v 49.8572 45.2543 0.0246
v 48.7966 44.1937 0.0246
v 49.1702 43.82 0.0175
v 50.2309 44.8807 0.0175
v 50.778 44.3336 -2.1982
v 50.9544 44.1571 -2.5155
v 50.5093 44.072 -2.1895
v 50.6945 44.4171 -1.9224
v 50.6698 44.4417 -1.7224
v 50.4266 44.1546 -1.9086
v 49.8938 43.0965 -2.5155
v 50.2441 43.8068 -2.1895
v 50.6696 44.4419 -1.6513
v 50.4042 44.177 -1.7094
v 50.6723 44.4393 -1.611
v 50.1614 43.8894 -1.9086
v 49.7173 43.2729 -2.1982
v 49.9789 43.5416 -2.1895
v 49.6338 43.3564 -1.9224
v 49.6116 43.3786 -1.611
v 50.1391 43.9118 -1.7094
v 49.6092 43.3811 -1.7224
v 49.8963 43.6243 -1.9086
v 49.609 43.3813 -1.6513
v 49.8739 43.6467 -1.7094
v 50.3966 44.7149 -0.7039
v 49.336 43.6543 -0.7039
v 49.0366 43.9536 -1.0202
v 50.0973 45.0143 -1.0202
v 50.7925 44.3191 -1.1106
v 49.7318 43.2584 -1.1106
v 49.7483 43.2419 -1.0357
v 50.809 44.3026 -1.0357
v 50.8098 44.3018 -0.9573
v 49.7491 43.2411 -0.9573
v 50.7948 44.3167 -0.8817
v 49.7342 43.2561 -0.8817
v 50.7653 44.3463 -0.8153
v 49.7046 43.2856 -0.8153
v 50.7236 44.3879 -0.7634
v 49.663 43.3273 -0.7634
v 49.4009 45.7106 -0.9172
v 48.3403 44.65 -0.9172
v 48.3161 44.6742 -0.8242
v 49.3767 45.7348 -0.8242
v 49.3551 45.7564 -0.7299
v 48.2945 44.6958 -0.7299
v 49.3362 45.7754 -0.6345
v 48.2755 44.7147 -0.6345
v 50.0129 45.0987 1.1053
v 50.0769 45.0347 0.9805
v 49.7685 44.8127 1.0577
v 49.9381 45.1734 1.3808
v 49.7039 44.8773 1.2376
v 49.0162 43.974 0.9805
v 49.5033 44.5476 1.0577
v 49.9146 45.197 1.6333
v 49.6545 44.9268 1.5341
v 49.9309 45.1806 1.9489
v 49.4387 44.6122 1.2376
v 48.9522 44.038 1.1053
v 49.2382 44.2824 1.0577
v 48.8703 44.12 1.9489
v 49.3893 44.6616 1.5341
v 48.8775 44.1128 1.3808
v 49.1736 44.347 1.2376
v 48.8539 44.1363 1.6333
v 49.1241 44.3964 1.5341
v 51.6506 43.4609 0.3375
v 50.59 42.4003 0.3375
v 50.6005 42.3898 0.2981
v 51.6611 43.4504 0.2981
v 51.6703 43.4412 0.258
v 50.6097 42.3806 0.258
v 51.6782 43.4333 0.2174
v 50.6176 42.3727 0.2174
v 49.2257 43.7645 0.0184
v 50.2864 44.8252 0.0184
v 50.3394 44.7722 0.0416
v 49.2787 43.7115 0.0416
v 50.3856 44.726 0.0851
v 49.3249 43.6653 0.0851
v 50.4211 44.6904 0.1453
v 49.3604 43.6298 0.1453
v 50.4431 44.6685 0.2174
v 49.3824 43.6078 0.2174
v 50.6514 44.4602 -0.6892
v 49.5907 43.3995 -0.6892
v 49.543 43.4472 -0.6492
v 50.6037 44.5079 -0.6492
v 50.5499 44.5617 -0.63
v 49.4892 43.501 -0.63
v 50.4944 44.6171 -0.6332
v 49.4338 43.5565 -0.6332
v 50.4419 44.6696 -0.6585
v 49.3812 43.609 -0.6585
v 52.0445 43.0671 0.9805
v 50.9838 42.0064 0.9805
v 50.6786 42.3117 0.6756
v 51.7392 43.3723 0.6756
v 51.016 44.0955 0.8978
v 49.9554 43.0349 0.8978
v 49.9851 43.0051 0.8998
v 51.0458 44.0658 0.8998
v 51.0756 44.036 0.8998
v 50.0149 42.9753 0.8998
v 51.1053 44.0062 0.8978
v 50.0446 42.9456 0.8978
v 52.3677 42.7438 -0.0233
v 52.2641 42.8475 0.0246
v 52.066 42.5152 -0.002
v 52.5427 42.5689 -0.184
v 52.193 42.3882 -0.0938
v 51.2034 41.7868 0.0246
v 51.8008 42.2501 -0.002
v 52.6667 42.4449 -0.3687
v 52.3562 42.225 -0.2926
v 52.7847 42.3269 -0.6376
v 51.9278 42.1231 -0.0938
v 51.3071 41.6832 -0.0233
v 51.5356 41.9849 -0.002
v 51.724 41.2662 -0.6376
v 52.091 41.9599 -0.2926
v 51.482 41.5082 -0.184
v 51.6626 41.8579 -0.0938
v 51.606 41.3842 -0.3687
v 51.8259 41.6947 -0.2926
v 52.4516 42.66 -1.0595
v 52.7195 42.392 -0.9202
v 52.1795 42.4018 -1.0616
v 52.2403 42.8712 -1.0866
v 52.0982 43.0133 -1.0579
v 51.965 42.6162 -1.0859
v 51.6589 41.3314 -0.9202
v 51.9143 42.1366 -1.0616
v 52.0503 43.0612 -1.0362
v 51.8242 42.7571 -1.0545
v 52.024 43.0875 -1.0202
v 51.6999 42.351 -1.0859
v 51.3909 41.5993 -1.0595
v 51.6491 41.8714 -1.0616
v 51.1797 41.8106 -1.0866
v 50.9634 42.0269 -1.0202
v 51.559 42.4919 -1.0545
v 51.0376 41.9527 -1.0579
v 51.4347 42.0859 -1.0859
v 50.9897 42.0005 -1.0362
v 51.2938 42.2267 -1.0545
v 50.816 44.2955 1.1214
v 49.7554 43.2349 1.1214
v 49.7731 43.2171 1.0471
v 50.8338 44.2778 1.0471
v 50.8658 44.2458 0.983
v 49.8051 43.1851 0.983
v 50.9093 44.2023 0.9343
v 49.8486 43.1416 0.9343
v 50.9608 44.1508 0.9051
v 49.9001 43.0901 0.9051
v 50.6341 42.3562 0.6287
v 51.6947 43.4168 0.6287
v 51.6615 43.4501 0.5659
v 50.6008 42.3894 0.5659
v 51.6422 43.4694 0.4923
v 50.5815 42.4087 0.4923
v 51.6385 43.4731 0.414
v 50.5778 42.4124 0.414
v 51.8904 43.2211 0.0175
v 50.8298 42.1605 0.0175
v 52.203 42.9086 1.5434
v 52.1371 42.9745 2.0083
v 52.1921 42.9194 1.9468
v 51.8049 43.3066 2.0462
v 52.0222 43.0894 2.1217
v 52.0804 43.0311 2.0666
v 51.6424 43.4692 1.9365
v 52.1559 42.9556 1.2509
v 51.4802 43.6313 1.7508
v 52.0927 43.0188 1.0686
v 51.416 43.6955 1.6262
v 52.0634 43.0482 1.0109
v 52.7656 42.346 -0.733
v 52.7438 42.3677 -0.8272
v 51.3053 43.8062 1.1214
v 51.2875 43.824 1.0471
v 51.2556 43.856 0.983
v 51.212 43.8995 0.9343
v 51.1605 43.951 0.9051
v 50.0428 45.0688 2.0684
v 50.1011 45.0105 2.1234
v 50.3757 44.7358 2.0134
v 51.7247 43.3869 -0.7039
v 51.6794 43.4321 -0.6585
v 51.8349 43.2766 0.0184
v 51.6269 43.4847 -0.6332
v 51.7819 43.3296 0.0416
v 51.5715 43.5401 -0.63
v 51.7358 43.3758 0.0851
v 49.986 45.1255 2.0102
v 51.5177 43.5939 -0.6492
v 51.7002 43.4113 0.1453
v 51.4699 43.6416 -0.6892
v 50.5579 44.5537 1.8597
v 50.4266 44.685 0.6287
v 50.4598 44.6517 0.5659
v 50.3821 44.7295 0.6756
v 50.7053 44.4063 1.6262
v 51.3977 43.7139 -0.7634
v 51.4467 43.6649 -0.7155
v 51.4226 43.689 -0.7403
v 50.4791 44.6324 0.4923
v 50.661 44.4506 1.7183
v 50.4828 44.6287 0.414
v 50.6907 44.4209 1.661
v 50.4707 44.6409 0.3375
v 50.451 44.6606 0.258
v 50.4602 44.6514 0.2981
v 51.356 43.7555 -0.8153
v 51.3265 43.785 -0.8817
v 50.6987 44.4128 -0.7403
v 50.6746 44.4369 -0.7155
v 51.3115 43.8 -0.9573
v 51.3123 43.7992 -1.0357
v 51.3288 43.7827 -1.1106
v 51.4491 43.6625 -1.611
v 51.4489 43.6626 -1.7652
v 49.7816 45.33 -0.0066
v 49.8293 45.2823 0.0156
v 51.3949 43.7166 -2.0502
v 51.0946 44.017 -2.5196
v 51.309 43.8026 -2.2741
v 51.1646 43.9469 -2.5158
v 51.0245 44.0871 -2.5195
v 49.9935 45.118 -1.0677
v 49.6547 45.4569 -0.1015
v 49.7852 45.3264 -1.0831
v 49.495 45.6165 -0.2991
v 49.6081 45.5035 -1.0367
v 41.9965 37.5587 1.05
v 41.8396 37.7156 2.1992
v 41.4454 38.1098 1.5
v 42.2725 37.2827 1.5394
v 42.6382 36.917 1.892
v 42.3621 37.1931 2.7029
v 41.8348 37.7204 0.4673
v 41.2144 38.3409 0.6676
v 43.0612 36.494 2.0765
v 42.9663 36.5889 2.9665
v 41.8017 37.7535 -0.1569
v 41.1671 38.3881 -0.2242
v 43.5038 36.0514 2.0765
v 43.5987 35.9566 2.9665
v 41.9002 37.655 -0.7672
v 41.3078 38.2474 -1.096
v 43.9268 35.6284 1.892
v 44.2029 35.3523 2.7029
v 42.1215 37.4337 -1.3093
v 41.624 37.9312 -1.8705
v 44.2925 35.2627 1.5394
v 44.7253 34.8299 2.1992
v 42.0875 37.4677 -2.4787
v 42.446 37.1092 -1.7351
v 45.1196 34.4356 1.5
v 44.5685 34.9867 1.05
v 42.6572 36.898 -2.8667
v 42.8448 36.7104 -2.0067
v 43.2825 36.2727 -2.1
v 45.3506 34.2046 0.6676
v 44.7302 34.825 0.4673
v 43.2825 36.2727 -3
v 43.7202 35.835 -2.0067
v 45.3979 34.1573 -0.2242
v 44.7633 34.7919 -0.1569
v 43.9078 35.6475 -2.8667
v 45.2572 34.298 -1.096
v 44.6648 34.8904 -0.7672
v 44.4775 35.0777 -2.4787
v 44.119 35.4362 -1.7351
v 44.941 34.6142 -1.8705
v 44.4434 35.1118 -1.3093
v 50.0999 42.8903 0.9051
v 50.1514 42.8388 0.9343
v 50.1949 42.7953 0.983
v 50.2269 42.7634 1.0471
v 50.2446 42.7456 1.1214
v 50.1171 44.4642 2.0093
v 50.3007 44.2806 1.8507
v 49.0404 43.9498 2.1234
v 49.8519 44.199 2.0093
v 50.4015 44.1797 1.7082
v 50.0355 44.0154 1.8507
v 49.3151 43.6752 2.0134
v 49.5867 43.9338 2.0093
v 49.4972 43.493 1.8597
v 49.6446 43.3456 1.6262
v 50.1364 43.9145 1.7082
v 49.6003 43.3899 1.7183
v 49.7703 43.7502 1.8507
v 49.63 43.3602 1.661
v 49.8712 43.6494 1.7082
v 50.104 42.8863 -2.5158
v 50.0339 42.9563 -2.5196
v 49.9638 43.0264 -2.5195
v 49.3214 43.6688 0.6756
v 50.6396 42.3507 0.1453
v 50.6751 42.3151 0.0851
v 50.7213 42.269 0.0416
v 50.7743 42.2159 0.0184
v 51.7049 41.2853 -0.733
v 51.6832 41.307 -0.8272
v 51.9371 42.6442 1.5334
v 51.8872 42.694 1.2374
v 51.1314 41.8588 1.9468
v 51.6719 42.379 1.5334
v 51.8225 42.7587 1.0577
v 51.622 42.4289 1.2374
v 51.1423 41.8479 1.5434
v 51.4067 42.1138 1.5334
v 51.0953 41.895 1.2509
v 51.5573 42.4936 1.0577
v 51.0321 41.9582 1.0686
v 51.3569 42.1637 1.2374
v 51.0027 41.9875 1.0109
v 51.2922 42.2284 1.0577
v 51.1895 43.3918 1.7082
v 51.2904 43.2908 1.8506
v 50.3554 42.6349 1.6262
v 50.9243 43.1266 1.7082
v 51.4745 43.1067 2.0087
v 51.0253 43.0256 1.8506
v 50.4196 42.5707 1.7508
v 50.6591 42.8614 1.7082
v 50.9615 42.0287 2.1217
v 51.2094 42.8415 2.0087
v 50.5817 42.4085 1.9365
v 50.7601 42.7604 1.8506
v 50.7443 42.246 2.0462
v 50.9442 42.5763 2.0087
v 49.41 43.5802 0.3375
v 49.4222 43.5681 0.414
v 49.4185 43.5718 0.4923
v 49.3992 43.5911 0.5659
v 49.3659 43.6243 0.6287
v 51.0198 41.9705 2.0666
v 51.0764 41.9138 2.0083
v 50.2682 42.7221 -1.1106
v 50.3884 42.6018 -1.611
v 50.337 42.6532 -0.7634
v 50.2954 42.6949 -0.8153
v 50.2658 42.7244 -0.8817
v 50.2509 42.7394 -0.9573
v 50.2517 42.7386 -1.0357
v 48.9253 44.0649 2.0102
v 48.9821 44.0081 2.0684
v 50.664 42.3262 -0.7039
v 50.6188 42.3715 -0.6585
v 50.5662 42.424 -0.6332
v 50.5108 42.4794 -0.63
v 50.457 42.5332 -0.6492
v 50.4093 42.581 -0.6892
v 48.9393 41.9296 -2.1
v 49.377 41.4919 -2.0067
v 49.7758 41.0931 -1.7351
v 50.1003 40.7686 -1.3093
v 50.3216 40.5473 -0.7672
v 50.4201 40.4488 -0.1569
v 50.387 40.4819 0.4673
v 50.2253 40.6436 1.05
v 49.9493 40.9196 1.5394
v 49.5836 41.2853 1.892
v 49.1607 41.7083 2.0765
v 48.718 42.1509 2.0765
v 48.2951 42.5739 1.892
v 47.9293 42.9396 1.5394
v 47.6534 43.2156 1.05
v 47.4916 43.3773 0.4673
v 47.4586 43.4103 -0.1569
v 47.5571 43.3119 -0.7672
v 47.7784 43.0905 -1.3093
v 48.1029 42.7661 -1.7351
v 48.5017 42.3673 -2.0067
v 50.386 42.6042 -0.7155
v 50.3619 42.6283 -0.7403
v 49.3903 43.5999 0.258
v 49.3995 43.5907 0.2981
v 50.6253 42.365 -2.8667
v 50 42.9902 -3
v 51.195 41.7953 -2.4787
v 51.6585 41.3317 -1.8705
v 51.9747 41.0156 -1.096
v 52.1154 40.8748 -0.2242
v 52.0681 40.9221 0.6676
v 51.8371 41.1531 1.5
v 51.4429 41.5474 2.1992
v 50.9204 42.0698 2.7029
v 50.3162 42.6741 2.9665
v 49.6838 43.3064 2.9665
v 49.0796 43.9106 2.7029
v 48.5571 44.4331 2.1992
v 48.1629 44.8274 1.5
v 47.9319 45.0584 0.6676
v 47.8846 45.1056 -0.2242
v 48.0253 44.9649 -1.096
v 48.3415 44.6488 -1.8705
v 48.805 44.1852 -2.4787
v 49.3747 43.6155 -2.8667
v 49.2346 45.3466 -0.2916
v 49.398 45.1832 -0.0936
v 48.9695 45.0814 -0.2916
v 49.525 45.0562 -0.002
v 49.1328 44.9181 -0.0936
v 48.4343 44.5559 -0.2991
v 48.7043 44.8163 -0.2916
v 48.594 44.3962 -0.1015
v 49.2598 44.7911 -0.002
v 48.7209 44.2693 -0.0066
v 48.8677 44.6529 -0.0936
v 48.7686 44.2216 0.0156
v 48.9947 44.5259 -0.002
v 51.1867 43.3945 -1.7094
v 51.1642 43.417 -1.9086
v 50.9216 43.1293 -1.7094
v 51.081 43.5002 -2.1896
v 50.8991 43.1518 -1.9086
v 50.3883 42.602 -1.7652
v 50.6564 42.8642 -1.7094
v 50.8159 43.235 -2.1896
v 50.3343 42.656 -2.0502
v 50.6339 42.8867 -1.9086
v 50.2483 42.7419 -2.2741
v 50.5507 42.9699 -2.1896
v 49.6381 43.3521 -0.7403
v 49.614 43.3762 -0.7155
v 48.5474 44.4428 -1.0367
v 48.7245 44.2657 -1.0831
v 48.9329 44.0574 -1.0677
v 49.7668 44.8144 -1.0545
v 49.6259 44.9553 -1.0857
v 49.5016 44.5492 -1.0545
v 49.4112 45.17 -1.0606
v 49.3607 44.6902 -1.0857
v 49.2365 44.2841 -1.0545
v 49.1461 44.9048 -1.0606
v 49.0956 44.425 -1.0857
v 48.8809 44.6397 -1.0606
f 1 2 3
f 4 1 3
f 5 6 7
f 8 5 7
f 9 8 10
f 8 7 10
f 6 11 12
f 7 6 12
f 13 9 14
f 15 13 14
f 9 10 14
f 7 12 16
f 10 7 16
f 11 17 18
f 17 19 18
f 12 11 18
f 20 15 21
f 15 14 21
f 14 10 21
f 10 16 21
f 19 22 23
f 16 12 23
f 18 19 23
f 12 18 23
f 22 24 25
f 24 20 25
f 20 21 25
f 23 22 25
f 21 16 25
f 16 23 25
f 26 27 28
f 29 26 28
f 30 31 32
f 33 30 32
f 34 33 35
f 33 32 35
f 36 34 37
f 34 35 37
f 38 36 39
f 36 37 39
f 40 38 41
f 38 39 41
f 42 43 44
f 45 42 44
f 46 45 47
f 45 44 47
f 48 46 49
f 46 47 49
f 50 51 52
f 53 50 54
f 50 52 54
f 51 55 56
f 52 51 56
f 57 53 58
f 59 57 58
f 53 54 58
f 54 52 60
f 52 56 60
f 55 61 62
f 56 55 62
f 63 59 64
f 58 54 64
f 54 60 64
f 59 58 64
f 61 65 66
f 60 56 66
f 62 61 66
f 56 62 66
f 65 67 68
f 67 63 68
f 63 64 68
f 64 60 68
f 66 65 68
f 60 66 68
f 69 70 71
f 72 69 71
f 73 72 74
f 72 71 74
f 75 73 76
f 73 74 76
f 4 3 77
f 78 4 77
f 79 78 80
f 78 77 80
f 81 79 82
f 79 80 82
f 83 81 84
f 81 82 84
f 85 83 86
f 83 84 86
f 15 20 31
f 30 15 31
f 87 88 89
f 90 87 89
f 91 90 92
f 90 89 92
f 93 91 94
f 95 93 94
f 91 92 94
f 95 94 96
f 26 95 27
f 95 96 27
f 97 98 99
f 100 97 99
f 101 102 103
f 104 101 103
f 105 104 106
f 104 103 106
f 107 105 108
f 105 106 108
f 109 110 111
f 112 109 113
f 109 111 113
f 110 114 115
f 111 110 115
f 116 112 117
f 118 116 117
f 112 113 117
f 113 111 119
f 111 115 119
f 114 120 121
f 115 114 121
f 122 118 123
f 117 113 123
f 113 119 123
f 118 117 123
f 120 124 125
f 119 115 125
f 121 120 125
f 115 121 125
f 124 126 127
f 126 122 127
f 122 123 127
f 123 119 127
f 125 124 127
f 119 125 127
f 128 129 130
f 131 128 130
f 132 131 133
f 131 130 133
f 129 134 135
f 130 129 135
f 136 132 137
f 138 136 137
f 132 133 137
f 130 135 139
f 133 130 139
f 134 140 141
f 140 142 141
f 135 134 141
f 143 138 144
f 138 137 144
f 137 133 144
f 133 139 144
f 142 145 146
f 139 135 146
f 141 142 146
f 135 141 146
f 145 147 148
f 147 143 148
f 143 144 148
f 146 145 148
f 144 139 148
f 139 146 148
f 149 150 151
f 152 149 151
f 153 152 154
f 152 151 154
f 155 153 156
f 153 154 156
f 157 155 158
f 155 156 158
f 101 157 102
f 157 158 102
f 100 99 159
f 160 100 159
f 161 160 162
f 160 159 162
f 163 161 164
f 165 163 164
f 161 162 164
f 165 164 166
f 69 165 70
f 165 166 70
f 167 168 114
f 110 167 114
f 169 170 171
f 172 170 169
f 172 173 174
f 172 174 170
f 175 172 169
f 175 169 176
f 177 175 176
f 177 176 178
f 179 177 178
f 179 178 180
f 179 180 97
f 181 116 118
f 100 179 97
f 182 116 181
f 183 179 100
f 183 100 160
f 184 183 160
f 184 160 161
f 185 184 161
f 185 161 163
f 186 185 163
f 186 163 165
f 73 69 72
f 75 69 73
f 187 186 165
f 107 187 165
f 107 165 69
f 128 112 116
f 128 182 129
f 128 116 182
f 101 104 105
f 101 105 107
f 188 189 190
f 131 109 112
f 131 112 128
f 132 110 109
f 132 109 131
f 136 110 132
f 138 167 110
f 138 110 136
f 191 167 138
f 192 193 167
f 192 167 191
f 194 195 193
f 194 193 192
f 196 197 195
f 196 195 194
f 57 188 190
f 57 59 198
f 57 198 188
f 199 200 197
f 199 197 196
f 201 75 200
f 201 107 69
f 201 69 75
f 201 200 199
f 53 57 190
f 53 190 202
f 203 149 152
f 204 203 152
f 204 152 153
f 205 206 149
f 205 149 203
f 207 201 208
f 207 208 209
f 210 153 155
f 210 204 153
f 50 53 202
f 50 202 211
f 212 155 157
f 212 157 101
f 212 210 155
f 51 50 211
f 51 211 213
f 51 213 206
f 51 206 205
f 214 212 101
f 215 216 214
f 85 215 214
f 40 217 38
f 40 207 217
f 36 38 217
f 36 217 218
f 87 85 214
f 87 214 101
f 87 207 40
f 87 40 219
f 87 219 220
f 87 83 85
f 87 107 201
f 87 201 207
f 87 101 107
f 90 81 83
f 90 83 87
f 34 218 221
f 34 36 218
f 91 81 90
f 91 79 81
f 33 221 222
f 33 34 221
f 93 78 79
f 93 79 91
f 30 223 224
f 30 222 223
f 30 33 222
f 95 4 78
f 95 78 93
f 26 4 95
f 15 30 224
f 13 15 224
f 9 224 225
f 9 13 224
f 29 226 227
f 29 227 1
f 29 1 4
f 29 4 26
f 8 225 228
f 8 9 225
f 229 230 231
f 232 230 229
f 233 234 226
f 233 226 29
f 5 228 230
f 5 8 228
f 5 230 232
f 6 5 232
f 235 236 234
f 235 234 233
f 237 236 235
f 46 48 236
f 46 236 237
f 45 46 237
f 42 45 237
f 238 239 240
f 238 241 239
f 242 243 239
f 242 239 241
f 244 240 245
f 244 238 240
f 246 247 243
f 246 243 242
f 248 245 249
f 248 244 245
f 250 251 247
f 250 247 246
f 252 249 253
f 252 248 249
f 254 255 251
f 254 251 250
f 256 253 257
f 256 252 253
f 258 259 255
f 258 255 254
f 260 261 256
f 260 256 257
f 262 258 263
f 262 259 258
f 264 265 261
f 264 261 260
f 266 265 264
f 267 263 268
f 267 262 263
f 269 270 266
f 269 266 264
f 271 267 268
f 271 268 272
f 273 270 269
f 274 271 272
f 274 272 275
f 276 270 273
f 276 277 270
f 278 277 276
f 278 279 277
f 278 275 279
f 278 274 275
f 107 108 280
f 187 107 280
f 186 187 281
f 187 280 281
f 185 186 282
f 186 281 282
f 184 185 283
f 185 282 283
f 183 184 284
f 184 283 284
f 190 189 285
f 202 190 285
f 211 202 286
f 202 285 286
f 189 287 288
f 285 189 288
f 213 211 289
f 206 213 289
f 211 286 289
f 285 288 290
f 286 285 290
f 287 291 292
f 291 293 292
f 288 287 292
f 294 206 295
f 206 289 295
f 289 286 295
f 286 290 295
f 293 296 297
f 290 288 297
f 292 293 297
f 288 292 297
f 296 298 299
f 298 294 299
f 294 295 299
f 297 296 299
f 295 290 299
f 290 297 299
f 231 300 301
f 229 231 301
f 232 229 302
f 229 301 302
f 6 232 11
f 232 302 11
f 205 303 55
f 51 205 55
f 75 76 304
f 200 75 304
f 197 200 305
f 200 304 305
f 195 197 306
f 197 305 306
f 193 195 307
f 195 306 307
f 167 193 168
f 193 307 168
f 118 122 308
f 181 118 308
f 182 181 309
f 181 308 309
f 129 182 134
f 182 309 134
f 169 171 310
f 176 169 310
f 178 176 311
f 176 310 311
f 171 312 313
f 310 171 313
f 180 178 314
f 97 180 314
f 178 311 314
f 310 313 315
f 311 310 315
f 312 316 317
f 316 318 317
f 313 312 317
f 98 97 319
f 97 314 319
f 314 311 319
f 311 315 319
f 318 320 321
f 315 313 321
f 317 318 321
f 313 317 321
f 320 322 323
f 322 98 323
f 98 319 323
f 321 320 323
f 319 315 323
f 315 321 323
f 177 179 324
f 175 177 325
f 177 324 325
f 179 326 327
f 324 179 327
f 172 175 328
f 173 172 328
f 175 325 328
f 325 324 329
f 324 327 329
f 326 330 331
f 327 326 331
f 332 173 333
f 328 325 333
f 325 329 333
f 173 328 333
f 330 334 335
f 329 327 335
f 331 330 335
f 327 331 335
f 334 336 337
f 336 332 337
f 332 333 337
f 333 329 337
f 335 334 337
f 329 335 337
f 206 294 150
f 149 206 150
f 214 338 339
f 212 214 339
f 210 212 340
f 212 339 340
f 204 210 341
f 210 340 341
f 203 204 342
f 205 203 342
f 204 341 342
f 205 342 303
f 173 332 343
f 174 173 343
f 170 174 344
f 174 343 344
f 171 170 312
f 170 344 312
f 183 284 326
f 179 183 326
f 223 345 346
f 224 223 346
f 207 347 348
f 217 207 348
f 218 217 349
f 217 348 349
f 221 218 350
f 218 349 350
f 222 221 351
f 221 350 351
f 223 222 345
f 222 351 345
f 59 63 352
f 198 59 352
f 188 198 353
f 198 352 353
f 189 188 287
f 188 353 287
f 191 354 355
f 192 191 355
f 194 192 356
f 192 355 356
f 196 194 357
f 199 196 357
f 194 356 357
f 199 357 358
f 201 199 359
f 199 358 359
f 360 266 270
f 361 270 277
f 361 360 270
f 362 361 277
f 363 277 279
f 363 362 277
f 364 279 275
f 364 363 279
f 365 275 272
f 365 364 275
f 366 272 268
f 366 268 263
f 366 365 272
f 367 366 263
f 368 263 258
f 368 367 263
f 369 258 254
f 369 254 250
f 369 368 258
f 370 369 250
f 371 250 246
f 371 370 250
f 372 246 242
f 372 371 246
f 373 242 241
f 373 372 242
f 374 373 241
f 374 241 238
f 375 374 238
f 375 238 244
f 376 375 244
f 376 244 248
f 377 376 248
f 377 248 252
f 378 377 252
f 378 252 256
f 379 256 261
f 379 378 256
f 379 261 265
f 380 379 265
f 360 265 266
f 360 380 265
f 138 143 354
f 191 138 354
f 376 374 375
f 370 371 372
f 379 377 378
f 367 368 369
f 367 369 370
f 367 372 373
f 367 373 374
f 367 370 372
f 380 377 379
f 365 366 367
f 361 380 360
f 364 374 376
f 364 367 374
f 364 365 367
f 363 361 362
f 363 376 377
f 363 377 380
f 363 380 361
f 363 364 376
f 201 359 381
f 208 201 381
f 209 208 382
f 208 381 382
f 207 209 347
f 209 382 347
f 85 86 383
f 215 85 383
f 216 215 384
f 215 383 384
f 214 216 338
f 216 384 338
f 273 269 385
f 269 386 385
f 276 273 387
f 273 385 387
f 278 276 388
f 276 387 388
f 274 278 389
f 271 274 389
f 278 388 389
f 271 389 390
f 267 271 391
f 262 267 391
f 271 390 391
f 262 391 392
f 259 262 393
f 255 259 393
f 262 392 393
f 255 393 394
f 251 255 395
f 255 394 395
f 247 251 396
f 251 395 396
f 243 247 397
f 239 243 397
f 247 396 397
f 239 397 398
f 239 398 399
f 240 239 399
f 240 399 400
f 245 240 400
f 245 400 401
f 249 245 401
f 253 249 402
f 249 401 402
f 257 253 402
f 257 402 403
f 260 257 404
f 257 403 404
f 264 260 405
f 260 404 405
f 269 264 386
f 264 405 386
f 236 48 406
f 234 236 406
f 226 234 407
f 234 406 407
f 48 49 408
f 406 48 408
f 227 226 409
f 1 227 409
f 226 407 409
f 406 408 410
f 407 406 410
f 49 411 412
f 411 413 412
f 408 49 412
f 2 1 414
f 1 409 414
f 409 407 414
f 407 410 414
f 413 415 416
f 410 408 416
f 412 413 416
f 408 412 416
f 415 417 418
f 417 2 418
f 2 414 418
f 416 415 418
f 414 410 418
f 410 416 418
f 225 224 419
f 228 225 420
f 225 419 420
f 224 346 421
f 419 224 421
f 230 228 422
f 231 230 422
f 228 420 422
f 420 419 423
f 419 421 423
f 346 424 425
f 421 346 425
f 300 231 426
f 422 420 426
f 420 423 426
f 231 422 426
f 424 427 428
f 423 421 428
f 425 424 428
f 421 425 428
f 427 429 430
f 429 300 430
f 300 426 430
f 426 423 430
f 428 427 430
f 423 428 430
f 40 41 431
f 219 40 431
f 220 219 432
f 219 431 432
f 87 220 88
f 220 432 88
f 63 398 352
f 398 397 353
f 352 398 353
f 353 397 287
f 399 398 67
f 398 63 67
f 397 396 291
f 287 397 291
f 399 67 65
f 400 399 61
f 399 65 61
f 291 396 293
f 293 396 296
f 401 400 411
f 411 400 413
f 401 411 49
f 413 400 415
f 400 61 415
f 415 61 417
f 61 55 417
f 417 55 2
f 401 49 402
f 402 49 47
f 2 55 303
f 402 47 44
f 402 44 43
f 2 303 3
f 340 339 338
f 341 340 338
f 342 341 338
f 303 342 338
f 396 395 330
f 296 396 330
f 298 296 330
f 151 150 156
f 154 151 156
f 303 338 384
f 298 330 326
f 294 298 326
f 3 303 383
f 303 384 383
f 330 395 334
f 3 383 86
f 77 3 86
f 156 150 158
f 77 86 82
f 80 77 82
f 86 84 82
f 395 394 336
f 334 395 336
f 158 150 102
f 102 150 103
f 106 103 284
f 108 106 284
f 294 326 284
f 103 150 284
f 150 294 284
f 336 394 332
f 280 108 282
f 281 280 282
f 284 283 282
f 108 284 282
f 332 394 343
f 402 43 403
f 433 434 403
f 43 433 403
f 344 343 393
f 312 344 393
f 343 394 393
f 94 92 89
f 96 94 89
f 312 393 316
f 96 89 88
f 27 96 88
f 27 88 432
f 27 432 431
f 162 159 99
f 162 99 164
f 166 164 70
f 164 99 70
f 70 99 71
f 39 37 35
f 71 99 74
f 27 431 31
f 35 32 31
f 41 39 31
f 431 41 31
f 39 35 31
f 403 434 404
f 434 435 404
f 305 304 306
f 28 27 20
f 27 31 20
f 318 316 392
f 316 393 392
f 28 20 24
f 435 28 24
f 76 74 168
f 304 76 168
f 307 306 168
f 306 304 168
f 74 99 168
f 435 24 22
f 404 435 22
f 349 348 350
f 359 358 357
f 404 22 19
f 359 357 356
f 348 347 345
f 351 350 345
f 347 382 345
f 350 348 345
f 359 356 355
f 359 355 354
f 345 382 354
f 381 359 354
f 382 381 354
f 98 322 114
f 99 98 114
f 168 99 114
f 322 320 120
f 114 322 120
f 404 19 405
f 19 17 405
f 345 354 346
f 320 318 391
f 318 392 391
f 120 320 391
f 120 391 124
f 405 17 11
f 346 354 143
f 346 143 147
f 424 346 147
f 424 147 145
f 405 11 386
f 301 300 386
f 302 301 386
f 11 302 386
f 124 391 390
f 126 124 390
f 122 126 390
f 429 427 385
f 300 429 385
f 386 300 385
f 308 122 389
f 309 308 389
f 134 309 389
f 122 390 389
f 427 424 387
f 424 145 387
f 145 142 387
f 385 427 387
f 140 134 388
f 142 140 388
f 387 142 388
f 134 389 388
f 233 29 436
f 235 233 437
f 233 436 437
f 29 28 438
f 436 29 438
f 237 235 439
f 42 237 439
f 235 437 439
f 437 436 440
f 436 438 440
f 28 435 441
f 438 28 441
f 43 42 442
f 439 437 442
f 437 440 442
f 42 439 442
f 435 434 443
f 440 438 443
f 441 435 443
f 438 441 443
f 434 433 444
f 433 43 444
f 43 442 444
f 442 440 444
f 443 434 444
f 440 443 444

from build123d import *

# Parameters (mm, degrees)
PAD032_DEPTH            = 1.5
SKETCH052_R             = 3
PAD033_DEPTH            = 1.5
SKETCH053_R             = 3
SKETCH053_R_2           = 2.1
PAD034_DEPTH            = 8
BODY020_PITCH_ANGLE     = 90
BODY020_PLACEMENT_ANGLE = 45


with BuildPart() as part:
    # InvoluteGear005 → Pad032 (new body)
    with BuildSketch(Plane.XY):
        with BuildLine():
            Line((1.110631, -0.379257), (1.611002, -0.549274))
            add(Edge.make_bspline(
                [(1.611002, -0.549274), (1.657084, -0.555348), (1.841436, -0.576411), (2.183492, -0.491872), (2.515793, -0.147021)],
                knots=[0, 0, 0, 0, 0, 1, 1, 1, 1, 1], degree=4))
            ThreePointArc((2.515793, -0.147021), (2.520042, 0.0016), (2.515519, 0.150213))
            add(Edge.make_bspline(
                [(2.515519, 0.150213), (2.183492, 0.491872), (1.841436, 0.576411), (1.657084, 0.555348), (1.611002, 0.549274)],
                knots=[0, 0, 0, 0, 0, 1, 1, 1, 1, 1], degree=4))
            Line((1.611002, 0.549274), (1.110631, 0.379257))
            ThreePointArc((1.110631, 0.379257), (0.918725, 0.36265), (0.763436, 0.476619))
            ThreePointArc((0.763436, 0.476619), (0.728115, 0.529007), (0.689206, 0.578787))
            ThreePointArc((0.689206, 0.578787), (0.628802, 0.761694), (0.703899, 0.939076))
            Line((0.703899, 0.939076), (1.020218, 1.362419))
            add(Edge.make_bspline(
                [(1.020218, 1.362419), (1.040234, 1.404369), (1.117234, 1.573189), (1.142534, 1.924628), (0.917248, 2.34723)],
                knots=[0, 0, 0, 0, 0, 1, 1, 1, 1, 1], degree=4))
            ThreePointArc((0.917248, 2.34723), (0.777214, 2.397197), (0.634477, 2.438819))
            add(Edge.make_bspline(
                [(0.634477, 2.438819), (0.206938, 2.228621), (0.020836, 1.92943), (-0.0161, 1.747593), (-0.024564, 1.701889)],
                knots=[0, 0, 0, 0, 0, 1, 1, 1, 1, 1], degree=4))
            Line((-0.024564, 1.701889), (-0.017491, 1.17347))
            ThreePointArc((-0.017491, 1.17347), (-0.060999, 0.985824), (-0.217377, 0.873354))
            ThreePointArc((-0.217377, 0.873354), (-0.278115, 0.855951), (-0.337483, 0.834329))
            ThreePointArc((-0.337483, 0.834329), (-0.530104, 0.833403), (-0.675598, 0.959638))
            Line((-0.675598, 0.959638), (-0.980473, 1.391296))
            add(Edge.make_bspline(
                [(-0.980473, 1.391296), (-1.014184, 1.423295), (-1.150947, 1.548695), (-1.477367, 1.681357), (-1.948903, 1.597689)],
                knots=[0, 0, 0, 0, 0, 1, 1, 1, 1, 1], degree=4))
            ThreePointArc((-1.948903, 1.597689), (-2.039698, 1.479949), (-2.123391, 1.35706))
            add(Edge.make_bspline(
                [(-2.123391, 1.35706), (-2.055597, 0.885492), (-1.828559, 0.616043), (-1.667035, 0.524724), (-1.626183, 0.502551)],
                knots=[0, 0, 0, 0, 0, 1, 1, 1, 1, 1], degree=4))
            Line((-1.626183, 0.502551), (-1.121441, 0.345987))
            ThreePointArc((-1.121441, 0.345987), (-0.956425, 0.246623), (-0.897782, 0.063143))
            ThreePointArc((-0.897782, 0.063143), (-0.9, 0), (-0.897782, -0.063143))
            ThreePointArc((-0.897782, -0.063143), (-0.956425, -0.246623), (-1.121441, -0.345987))
            Line((-1.121441, -0.345987), (-1.626183, -0.502551))
            add(Edge.make_bspline(
                [(-1.626183, -0.502551), (-1.667035, -0.524724), (-1.828559, -0.616043), (-2.055597, -0.885492), (-2.121736, -1.359804)],
                knots=[0, 0, 0, 0, 0, 1, 1, 1, 1, 1], degree=4))
            ThreePointArc((-2.121736, -1.359804), (-2.037816, -1.482538), (-1.946804, -1.60011))
            add(Edge.make_bspline(
                [(-1.946804, -1.60011), (-1.477367, -1.681357), (-1.150947, -1.548695), (-1.014184, -1.423295), (-0.980473, -1.391296)],
                knots=[0, 0, 0, 0, 0, 1, 1, 1, 1, 1], degree=4))
            Line((-0.980473, -1.391296), (-0.675598, -0.959638))
            ThreePointArc((-0.675598, -0.959638), (-0.530104, -0.833403), (-0.337483, -0.834329))
            ThreePointArc((-0.337483, -0.834329), (-0.278115, -0.855951), (-0.217377, -0.873354))
            ThreePointArc((-0.217377, -0.873354), (-0.060999, -0.985824), (-0.017491, -1.17347))
            Line((-0.017491, -1.17347), (-0.024564, -1.701889))
            add(Edge.make_bspline(
                [(-0.024564, -1.701889), (-0.0161, -1.747593), (0.020836, -1.92943), (0.206938, -2.228621), (0.637598, -2.438094)],
                knots=[0, 0, 0, 0, 0, 1, 1, 1, 1, 1], degree=4))
            ThreePointArc((0.637598, -2.438094), (0.780258, -2.396208), (0.9202, -2.345982))
            add(Edge.make_bspline(
                [(0.9202, -2.345982), (1.142534, -1.924628), (1.117234, -1.573189), (1.040234, -1.404369), (1.020218, -1.362419)],
                knots=[0, 0, 0, 0, 0, 1, 1, 1, 1, 1], degree=4))
            Line((1.020218, -1.362419), (0.703899, -0.939076))
            ThreePointArc((0.703899, -0.939076), (0.628802, -0.761694), (0.689206, -0.578787))
            ThreePointArc((0.689206, -0.578787), (0.728115, -0.529007), (0.763436, -0.476619))
            ThreePointArc((0.763436, -0.476619), (0.918725, -0.36265), (1.110631, -0.379257))
        make_face()
    extrude(amount=PAD032_DEPTH)

    # Sketch052 (on Face41 of Pad032) → Pad033 (join)
    with BuildSketch(Plane(origin=(0, 0, 0), x_dir=(1, 0, 0), z_dir=(0, 0, -1))):
        Circle(SKETCH052_R)
    extrude(amount=PAD033_DEPTH)

    # Sketch053 (on Face3 of Pad033) → Pad034 (join)
    with BuildSketch(Plane(origin=(0, 0, -1.5), x_dir=(1, 0, 0), z_dir=(0, 0, -1))):
        Circle(SKETCH053_R)
        Circle(SKETCH053_R_2, mode=Mode.SUBTRACT)
    extrude(amount=PAD034_DEPTH)


with BuildPart() as part_1:
    # Body020 pitch: moved
    add(part.part.rotate(Axis((0, 0, 0), (0, 1, 0)), BODY020_PITCH_ANGLE))


with BuildPart() as part_2:
    # Body020 placement: moved
    add(part_1.part.moved(Location((50, 42.990236, 0))).rotate(Axis((50, 42.990236, 0), (0, 0, 1)), BODY020_PLACEMENT_ANGLE))


solid = part_2.part
